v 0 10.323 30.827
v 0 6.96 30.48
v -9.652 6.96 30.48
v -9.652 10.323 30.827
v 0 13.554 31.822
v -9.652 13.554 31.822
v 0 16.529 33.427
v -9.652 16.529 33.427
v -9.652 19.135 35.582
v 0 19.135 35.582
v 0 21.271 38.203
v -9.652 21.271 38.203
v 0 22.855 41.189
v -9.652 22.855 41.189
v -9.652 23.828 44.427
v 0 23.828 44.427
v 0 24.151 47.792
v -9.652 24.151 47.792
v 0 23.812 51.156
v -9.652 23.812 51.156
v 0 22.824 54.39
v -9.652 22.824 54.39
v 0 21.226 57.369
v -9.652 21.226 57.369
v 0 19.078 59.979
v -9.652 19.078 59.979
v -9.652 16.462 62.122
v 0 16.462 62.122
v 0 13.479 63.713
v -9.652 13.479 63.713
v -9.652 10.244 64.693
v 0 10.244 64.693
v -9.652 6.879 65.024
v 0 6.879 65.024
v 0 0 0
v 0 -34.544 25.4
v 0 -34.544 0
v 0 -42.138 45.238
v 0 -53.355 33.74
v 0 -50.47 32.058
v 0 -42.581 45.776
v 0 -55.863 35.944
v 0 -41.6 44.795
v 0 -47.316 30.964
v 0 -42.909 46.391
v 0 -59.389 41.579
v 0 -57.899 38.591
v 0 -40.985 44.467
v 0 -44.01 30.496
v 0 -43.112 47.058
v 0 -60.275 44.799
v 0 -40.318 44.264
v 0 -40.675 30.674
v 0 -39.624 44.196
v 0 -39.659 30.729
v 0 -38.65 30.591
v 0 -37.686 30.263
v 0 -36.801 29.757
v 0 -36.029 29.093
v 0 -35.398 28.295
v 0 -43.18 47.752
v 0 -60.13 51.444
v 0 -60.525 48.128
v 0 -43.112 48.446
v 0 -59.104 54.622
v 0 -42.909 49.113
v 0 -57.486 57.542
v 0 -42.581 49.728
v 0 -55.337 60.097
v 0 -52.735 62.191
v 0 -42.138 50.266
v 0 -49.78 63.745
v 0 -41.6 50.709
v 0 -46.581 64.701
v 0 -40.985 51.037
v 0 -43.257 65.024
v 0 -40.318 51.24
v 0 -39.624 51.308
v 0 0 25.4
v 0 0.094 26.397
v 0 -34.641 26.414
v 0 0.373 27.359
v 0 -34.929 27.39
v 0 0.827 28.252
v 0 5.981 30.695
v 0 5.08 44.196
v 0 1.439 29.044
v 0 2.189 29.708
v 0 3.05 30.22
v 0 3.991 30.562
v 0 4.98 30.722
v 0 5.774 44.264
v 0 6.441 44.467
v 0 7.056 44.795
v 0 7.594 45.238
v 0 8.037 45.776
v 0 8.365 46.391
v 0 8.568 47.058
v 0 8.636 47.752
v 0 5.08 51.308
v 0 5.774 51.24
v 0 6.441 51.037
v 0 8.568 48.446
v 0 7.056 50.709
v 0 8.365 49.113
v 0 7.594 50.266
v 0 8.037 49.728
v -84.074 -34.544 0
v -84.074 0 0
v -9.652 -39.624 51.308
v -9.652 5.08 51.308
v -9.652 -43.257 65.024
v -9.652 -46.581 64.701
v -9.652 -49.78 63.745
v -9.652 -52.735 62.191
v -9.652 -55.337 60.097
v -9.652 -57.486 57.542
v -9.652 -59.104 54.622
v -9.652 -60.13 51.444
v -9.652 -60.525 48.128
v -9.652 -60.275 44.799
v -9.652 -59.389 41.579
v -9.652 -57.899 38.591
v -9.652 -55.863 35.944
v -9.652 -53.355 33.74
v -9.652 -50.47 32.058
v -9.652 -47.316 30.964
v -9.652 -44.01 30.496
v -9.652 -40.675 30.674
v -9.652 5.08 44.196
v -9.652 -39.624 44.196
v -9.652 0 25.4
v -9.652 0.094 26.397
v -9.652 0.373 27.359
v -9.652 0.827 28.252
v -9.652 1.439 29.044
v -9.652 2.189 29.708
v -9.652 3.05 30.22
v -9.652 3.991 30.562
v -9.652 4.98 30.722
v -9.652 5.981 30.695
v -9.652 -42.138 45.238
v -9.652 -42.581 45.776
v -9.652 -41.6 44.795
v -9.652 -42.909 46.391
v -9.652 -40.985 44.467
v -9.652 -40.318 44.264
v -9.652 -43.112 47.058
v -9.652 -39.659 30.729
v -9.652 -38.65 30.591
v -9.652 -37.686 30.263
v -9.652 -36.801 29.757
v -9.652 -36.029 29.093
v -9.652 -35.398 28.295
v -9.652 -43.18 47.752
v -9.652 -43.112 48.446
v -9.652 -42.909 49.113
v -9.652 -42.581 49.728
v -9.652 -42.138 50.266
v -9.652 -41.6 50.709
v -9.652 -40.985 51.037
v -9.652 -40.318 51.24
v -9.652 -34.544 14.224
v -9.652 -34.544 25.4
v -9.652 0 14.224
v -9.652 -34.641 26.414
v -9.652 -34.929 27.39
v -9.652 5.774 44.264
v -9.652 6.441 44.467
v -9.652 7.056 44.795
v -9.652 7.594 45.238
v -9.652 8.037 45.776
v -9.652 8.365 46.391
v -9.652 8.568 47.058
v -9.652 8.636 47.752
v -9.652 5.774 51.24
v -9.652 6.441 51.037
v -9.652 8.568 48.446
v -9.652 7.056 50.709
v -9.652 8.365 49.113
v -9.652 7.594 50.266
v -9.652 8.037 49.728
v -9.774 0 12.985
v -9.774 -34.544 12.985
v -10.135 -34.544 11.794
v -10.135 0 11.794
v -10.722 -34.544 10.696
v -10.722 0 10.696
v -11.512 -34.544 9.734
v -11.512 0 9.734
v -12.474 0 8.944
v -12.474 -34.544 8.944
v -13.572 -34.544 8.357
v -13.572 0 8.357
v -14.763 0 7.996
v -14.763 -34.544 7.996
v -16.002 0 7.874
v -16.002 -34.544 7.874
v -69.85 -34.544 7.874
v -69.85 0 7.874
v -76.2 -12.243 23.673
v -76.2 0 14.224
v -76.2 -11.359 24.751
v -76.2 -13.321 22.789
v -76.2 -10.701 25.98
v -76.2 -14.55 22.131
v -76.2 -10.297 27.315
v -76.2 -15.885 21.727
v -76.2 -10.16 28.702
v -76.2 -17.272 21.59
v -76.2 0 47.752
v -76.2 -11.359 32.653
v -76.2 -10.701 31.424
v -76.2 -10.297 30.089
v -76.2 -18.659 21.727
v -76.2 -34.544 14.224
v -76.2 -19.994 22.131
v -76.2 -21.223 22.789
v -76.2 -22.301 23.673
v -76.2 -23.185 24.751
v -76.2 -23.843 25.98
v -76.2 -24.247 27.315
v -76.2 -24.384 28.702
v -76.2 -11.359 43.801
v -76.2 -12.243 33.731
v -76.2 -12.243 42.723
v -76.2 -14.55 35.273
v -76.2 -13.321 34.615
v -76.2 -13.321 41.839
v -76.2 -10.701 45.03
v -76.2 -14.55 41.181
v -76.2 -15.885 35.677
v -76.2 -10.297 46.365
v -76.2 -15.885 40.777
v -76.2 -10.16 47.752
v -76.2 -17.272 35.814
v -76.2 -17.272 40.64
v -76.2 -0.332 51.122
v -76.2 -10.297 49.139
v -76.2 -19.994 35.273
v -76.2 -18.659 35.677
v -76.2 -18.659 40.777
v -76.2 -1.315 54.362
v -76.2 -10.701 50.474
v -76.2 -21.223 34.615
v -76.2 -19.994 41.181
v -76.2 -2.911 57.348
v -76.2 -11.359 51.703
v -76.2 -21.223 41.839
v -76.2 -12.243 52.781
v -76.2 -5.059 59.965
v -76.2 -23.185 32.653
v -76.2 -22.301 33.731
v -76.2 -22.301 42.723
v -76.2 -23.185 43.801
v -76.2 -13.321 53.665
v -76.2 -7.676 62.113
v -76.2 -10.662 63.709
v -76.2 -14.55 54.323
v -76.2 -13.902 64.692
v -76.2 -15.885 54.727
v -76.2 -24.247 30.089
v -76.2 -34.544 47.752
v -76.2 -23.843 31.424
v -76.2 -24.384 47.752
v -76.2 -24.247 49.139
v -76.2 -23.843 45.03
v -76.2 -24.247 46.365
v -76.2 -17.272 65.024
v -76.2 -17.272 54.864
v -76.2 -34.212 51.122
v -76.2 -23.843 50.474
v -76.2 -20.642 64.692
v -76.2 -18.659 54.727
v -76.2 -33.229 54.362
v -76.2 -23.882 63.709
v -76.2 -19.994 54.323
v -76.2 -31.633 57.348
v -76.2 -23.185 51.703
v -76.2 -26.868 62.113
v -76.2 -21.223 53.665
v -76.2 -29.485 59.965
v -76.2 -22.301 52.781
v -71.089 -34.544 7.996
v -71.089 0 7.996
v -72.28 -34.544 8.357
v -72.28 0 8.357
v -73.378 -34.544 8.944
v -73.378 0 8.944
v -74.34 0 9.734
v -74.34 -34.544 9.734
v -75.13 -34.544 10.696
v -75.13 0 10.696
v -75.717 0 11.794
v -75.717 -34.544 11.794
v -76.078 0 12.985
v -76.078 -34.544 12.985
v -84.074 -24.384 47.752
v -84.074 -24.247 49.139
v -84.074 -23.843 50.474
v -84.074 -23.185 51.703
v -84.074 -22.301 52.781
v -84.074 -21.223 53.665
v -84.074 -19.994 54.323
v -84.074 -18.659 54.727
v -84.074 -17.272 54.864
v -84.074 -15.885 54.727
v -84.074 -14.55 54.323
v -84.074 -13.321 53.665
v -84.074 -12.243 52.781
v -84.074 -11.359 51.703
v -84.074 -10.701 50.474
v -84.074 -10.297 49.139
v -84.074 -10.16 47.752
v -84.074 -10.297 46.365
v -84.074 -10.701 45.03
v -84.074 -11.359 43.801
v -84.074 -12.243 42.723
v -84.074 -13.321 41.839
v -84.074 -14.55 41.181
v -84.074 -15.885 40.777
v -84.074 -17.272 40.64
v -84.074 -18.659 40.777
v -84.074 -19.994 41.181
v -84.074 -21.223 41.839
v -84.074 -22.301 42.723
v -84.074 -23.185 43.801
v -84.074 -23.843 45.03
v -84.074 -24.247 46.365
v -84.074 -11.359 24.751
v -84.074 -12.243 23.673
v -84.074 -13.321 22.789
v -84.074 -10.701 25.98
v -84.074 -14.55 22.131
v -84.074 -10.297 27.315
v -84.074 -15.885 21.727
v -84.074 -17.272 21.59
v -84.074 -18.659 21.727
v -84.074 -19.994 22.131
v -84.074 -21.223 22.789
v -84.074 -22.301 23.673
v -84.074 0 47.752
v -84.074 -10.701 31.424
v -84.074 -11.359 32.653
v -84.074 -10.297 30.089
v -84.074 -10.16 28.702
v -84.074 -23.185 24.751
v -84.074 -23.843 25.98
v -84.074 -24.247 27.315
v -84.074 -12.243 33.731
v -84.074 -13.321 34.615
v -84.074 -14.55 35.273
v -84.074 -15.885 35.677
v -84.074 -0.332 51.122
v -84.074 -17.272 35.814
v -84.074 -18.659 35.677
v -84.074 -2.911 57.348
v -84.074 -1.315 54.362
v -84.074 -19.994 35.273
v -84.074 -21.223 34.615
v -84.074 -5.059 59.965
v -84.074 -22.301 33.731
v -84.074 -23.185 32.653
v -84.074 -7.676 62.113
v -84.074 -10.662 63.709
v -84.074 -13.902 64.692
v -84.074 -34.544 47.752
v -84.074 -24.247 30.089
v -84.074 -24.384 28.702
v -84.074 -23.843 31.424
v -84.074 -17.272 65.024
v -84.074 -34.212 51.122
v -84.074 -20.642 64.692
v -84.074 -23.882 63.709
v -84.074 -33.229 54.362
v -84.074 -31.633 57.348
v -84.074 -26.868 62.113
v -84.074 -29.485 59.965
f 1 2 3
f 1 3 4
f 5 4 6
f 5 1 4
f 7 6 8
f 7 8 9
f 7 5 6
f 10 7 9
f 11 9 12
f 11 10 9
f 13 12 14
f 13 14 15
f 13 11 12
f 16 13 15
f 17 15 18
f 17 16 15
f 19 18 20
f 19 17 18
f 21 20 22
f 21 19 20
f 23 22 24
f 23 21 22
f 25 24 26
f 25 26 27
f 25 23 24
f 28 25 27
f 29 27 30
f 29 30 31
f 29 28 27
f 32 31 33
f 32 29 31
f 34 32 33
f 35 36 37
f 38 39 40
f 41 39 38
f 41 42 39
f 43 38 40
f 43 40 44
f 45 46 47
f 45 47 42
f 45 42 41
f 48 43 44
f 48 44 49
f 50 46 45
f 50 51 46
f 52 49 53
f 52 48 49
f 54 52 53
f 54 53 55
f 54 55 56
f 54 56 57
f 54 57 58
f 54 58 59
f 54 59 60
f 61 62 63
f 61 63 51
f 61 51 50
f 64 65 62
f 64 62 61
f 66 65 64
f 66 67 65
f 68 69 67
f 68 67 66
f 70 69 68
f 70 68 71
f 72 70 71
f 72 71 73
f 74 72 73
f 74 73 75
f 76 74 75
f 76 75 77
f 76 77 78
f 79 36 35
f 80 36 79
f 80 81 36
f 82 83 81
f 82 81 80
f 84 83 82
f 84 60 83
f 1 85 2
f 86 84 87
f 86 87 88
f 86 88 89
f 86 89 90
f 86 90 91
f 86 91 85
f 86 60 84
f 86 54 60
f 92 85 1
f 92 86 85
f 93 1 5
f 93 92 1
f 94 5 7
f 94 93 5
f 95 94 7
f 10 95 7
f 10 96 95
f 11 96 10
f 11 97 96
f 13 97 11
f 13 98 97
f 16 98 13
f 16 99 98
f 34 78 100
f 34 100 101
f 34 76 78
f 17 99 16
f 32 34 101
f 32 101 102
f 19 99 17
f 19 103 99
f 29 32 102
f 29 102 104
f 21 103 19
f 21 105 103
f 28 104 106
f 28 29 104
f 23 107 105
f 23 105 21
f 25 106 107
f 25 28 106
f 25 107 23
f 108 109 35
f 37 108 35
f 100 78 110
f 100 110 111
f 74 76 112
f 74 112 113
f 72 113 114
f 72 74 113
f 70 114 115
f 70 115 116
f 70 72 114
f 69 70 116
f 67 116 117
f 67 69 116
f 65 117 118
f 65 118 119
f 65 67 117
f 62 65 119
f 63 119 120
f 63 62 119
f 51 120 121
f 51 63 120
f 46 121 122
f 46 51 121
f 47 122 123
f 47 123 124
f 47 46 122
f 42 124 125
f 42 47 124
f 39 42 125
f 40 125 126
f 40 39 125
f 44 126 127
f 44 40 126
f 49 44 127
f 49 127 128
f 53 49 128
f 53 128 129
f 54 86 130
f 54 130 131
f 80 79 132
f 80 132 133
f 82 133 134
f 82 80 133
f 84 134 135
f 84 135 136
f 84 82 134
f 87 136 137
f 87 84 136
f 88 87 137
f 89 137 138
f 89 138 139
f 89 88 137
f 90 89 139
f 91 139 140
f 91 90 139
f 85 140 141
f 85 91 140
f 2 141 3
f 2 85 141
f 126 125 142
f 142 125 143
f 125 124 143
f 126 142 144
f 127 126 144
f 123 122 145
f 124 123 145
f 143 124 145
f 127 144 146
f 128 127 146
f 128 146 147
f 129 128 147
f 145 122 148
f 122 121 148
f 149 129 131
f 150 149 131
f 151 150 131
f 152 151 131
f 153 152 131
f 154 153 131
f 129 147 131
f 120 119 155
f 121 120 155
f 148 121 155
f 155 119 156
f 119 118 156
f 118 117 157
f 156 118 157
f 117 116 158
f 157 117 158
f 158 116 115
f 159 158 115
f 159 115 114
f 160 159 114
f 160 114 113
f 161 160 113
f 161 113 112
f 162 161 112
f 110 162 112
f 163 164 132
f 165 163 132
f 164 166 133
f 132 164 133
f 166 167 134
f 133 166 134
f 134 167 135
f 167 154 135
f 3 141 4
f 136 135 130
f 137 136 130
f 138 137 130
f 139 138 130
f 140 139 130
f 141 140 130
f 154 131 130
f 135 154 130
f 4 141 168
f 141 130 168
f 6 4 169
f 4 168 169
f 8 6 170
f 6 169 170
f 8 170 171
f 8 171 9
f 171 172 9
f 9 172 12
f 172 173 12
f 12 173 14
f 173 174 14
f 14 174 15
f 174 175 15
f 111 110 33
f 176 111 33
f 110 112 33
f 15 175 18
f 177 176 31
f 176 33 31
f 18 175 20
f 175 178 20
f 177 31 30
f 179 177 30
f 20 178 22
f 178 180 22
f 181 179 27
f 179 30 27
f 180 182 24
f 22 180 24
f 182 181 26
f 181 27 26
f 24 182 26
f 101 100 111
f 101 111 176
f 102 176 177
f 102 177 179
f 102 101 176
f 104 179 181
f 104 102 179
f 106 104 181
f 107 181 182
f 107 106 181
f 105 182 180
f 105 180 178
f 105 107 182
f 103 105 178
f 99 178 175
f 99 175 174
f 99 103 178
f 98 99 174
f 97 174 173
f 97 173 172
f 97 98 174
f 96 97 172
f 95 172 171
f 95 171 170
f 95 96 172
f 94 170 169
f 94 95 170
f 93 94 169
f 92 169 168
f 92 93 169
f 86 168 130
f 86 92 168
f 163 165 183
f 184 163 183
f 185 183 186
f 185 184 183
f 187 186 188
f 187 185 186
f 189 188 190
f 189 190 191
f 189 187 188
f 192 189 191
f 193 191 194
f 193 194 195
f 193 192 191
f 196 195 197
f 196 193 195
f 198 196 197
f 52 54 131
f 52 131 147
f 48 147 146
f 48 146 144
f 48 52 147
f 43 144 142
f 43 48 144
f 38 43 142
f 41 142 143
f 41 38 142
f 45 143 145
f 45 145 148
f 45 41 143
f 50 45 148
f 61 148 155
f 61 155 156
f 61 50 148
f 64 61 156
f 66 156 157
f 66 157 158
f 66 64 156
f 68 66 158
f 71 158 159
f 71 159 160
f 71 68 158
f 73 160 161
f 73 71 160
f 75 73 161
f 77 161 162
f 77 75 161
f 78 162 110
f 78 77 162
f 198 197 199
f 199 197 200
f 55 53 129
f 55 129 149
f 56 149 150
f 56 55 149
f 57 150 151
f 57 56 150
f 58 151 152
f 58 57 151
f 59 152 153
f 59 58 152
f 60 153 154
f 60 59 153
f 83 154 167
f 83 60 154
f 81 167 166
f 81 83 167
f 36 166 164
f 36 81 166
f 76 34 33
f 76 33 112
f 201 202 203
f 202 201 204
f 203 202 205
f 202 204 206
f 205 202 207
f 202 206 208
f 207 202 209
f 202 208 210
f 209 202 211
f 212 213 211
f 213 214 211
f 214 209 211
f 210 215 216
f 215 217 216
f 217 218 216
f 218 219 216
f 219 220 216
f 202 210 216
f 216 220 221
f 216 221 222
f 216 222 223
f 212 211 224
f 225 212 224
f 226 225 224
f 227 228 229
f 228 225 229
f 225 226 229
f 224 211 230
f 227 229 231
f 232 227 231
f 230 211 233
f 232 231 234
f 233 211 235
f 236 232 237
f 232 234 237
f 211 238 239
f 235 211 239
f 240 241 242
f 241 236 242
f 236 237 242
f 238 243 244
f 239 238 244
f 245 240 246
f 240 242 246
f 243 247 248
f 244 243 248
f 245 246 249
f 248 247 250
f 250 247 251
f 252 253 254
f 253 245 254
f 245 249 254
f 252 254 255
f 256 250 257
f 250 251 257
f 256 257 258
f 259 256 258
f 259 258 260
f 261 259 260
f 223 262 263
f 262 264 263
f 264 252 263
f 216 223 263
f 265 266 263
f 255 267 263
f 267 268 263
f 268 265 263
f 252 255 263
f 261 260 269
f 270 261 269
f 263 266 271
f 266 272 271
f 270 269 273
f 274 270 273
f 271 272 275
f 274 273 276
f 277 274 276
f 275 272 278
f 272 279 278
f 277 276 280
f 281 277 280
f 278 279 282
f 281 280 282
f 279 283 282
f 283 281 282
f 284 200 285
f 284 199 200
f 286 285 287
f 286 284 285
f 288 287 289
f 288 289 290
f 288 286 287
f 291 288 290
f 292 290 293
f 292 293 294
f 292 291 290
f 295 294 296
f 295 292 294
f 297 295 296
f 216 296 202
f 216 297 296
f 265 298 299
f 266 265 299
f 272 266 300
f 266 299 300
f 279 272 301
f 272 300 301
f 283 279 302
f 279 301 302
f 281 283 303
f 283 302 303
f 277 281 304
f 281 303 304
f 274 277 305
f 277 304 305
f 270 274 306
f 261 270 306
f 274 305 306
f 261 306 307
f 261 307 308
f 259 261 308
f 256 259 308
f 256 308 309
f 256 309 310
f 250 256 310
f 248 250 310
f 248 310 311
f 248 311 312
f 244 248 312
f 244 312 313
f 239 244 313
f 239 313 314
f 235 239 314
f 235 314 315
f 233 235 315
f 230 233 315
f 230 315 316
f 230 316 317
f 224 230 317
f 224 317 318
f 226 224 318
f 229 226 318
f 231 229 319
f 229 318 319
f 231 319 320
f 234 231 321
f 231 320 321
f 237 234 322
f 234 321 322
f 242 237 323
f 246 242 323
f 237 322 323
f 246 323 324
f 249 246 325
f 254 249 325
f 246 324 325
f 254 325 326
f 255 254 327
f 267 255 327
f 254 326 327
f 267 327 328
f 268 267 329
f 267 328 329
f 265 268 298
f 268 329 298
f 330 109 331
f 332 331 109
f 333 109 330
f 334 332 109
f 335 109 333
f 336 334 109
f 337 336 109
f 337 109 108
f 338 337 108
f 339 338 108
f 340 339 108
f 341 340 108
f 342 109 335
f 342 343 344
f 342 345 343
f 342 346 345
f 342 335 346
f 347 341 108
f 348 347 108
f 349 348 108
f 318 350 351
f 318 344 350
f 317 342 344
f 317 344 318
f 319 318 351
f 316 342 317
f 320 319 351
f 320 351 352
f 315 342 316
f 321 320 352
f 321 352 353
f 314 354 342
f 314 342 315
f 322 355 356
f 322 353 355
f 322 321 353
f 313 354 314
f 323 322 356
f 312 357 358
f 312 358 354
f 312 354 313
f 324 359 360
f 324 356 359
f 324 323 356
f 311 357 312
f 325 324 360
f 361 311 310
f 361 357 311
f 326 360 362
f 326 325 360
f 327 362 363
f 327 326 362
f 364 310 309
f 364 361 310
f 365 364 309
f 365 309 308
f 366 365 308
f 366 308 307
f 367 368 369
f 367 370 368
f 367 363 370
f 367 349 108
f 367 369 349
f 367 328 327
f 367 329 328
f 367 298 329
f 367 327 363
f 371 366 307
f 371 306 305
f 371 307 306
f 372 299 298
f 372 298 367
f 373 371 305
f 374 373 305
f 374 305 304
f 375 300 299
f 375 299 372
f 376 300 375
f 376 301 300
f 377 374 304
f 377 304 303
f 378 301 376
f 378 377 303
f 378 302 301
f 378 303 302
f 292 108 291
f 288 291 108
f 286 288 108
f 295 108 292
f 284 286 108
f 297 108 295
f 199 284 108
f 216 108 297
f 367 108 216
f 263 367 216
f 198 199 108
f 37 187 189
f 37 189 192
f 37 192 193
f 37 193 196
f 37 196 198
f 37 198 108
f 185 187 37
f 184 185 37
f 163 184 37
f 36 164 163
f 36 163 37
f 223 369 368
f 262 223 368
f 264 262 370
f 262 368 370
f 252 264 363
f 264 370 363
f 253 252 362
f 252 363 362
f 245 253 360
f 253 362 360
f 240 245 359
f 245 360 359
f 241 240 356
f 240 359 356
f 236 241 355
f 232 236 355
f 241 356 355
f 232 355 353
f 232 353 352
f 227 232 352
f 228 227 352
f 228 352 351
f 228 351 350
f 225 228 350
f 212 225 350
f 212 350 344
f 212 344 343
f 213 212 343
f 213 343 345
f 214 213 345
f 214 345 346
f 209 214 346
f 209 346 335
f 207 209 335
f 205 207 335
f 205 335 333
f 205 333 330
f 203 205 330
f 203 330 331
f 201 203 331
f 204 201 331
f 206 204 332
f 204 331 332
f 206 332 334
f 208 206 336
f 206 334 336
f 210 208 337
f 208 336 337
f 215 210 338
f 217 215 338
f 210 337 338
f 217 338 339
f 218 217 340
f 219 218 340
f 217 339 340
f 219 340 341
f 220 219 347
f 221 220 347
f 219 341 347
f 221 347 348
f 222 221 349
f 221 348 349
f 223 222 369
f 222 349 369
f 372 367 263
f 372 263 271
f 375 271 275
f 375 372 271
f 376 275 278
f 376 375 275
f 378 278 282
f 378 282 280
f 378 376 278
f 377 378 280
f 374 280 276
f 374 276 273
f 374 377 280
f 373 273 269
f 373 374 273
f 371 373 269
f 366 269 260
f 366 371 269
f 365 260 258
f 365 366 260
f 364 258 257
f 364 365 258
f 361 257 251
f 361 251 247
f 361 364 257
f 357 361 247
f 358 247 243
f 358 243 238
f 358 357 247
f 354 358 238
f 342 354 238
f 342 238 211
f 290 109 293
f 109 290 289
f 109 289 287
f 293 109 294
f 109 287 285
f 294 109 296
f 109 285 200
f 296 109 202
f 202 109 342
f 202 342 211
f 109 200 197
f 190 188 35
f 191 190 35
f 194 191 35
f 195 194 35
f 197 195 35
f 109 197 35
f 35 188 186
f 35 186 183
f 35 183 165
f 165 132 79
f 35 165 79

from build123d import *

# Parameters (mm, degrees)
F1_DEPTH = 34.544
F3_DEPTH = 7.874
F5_DEPTH = 9.652
F6_R     = 7.112
F7_DEPTH = 25.4
F8_R     = 6.35


with BuildPart() as f1:
    # F0 (on Front) → F1 (new body)
    with BuildSketch(Plane.XZ):
        Polygon((0, 0), (0, 25.4), (-9.652, 25.4), (-9.652, 7.874), (-76.2, 7.874), (-76.2, 47.752), (-84.074, 47.752), (-84.074, 0), align=None)
    extrude(amount=F1_DEPTH)

    # F2 (on face) → F3 (join)
    with BuildSketch(Plane(origin=(-84.074, 0, 0), x_dir=(0, -1, 0), z_dir=(-1, 0, 0))):
        with BuildLine():
            ThreePointArc((34.544, 47.752), (17.272, 65.024), (0, 47.752))
            Line((0, 47.752), (34.544, 47.752))
        make_face()
    extrude(amount=-F3_DEPTH)

    # F4 (on face) → F5 (join)
    with BuildSketch(Plane.YZ):
        with BuildLine():
            Line((6.8788736876, 65.024), (-17.272, 65.024))
            Line((-17.272, 65.024), (-43.2572502127, 65.024))
            ThreePointArc((-43.2572502127, 65.024), (-60.480665025, 46.4574088668), (-40.6753511738, 30.6740674157))
            ThreePointArc((-40.6753511738, 30.6740674157), (-36.3996034701, 29.4437993991), (-34.544, 25.4))
            Line((-34.544, 25.4), (0, 25.4))
            ThreePointArc((0, 25.4), (2.1892001539, 29.708339579), (6.9598012479, 30.4801895932))
            ThreePointArc((6.9598012479, 30.4801895932), (24.1508262893, 47.7924638912), (6.8788736876, 65.024))
        make_face()
        with BuildLine():
            Line((5.08, 44.196), (-39.624, 44.196))
            ThreePointArc((-39.624, 44.196), (-43.18, 47.752), (-39.624, 51.308))
            Line((-39.624, 51.308), (-34.1739776358, 51.308))
            ThreePointArc((-34.1739776358, 51.308), (-28.1555369251, 61.163584843), (-17.272, 65.024))
            ThreePointArc((-17.272, 65.024), (-6.3884630749, 61.163584843), (-0.3700223642, 51.308))
            Line((-0.3700223642, 51.308), (5.08, 51.308))
            ThreePointArc((5.08, 51.308), (8.636, 47.752), (5.08, 44.196))
        make_face(mode=Mode.SUBTRACT)
        with BuildLine():
            ThreePointArc((-17.272, 65.024), (-28.1555369251, 61.163584843), (-34.1739776358, 51.308))
            Line((-34.1739776358, 51.308), (-0.3700223642, 51.308))
            ThreePointArc((-0.3700223642, 51.308), (-6.3884630749, 61.163584843), (-17.272, 65.024))
        make_face()
    extrude(amount=-F5_DEPTH)

    # F6 (on face) → F7 (cut)
    with BuildSketch(Plane(origin=(-84.074, 0, 0), x_dir=(0, -1, 0), z_dir=(-1, 0, 0))):
        with Locations((17.272, 47.752)):
            Circle(F6_R)
        with Locations((17.272, 28.702)):
            Circle(F6_R)
    extrude(amount=-F7_DEPTH, mode=Mode.SUBTRACT)

    # F8
    f8_edges = [f1.edges().sort_by_distance(p)[0] for p in [
        (-9.652, -17.272, 7.874),
        (-76.2, -17.272, 7.874),
    ]]
    fillet(f8_edges, radius=F8_R)


solid = f1.part
